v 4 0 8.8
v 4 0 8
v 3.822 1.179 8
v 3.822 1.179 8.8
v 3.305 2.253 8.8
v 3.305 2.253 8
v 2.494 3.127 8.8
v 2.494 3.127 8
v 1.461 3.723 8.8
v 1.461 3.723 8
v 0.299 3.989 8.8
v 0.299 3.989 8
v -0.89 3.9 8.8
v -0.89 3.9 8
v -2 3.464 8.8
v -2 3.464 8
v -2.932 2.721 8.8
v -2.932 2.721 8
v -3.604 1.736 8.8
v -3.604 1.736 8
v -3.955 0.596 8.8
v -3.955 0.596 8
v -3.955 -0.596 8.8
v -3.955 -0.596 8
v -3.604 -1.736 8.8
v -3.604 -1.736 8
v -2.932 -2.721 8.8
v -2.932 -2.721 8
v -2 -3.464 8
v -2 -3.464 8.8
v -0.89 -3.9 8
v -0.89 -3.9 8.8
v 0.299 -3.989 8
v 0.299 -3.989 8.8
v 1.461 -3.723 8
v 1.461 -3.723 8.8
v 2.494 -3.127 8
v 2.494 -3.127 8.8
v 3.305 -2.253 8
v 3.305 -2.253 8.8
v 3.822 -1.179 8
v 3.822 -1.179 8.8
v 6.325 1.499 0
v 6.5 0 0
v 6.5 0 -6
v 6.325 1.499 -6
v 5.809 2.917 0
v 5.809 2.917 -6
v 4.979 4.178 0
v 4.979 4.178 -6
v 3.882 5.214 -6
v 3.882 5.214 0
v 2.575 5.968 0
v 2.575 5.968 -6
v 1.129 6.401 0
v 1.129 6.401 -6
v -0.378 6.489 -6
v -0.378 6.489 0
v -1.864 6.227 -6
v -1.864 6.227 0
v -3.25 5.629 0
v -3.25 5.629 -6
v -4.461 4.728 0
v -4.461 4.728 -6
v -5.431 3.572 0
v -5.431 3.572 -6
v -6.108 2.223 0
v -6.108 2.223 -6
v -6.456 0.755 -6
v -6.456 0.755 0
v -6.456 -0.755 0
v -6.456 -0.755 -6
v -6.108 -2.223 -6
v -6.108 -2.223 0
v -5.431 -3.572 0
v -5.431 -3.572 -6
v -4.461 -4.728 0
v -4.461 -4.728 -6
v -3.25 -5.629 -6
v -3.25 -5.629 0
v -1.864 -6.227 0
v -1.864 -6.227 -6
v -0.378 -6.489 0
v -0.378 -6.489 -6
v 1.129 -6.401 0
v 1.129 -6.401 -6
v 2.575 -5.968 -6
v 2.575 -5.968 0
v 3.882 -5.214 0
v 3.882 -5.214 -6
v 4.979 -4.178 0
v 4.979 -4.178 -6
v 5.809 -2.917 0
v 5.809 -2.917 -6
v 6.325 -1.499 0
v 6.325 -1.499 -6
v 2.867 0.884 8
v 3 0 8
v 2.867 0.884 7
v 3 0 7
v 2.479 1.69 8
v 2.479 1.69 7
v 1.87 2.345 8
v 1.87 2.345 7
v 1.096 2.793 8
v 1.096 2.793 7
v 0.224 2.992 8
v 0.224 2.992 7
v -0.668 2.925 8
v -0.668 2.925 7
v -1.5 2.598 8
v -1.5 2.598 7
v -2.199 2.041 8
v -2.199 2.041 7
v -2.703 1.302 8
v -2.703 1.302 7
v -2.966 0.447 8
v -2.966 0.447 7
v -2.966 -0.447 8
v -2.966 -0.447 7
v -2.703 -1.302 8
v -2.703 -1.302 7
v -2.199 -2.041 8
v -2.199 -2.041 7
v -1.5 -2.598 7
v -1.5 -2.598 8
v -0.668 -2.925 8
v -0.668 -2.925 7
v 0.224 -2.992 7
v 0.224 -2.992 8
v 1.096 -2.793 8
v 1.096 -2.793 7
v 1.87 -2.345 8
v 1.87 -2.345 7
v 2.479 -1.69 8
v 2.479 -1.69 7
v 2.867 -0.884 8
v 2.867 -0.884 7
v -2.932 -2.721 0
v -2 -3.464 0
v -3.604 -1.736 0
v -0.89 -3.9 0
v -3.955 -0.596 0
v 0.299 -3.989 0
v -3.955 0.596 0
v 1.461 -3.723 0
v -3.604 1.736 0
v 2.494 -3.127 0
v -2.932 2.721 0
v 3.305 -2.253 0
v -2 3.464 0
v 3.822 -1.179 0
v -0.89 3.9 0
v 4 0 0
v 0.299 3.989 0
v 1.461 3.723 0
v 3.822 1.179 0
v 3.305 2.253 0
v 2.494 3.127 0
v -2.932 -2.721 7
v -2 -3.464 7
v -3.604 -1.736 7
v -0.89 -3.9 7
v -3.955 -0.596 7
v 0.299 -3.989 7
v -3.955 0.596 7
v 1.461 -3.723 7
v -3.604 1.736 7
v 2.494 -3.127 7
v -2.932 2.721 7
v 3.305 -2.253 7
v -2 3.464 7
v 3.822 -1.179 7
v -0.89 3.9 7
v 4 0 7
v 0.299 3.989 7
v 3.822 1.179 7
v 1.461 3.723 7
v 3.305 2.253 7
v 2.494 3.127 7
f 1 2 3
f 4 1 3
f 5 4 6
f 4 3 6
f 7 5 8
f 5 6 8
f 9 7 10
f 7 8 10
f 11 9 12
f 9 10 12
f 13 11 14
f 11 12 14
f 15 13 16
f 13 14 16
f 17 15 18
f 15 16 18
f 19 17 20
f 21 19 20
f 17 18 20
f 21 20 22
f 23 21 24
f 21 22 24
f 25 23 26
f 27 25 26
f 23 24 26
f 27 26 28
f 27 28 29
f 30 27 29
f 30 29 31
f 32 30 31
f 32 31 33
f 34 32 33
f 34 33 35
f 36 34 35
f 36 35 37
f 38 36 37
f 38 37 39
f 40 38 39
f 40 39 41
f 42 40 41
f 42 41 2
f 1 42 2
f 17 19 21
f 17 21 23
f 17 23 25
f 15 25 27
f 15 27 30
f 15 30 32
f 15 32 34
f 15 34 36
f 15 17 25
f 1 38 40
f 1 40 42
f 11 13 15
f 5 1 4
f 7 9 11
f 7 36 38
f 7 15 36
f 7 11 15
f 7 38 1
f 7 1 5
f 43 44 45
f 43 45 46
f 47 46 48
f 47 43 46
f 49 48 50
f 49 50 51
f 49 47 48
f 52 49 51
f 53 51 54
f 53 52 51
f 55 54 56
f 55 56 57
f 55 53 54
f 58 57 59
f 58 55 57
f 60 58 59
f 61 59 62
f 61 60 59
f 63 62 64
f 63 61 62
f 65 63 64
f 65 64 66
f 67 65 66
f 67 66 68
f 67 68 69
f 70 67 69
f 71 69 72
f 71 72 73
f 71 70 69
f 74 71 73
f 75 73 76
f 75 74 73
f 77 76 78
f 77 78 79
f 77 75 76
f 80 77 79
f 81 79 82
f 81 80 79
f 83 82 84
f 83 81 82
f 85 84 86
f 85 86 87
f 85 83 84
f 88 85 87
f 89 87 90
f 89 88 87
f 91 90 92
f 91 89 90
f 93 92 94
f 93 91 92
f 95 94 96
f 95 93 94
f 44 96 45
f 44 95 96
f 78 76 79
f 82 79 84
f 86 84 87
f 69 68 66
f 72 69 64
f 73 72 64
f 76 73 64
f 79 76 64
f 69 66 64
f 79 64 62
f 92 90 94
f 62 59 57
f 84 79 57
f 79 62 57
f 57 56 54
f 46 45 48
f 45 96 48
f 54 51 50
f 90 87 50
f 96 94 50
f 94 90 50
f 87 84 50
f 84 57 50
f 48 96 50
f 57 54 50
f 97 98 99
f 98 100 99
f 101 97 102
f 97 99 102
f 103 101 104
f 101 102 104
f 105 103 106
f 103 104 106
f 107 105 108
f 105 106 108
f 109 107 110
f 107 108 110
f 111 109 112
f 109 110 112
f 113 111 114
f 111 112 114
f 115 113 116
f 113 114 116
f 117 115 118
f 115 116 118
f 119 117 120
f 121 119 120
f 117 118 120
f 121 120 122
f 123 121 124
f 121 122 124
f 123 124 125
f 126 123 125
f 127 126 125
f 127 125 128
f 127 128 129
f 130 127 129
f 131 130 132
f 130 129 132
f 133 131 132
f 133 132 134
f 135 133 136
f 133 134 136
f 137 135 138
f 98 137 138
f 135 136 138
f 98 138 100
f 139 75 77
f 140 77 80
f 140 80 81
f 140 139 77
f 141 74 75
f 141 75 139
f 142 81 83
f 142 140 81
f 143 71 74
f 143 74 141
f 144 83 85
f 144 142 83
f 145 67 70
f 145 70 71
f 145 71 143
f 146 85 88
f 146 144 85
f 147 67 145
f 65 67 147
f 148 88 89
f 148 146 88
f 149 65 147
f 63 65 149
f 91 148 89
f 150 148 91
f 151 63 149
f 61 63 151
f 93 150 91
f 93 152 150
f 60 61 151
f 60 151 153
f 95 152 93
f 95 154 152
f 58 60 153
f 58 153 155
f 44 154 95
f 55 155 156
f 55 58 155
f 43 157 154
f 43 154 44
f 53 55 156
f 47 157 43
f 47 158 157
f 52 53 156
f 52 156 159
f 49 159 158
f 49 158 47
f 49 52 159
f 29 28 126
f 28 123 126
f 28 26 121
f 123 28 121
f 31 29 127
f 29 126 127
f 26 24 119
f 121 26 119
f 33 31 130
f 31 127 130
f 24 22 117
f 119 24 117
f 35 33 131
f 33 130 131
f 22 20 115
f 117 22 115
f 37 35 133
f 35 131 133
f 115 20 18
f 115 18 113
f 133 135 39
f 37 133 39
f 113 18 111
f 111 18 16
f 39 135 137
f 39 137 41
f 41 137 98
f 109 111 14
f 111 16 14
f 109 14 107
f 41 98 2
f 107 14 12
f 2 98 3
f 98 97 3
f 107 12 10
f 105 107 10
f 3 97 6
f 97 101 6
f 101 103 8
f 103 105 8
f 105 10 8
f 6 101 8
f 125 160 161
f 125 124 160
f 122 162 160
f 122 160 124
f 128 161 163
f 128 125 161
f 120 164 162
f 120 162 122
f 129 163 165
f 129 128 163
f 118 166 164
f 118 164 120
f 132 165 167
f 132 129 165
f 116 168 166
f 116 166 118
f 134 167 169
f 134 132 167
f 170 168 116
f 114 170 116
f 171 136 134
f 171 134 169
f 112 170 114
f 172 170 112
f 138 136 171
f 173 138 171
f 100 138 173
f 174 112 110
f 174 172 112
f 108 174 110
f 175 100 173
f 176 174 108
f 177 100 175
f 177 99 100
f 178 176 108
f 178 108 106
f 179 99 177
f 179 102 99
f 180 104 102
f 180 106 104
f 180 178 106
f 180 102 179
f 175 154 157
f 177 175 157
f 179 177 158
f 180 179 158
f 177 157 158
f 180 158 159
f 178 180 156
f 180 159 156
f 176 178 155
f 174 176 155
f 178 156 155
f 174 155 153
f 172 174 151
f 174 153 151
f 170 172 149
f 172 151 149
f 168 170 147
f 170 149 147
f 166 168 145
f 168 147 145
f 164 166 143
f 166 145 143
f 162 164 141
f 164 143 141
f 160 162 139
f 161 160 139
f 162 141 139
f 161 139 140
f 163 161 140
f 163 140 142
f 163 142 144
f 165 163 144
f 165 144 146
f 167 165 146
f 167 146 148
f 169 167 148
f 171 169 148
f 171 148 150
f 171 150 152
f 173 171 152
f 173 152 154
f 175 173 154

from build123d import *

# Parameters (mm, degrees)
SKETCH1_R           = 6.5
BOSS_EXTRUDE1_DEPTH = 6
SKETCH2_R           = 4
BOSS_EXTRUDE2_DEPTH = 8.8
SKETCH3_R           = 4
SKETCH3_R_2         = 3
CUT_EXTRUDE1_DEPTH  = 0.5


with BuildPart() as part:
    # Sketch1 → Boss-Extrude1 (new body)
    with BuildSketch(Plane.XY):
        Circle(SKETCH1_R)
    extrude(amount=-BOSS_EXTRUDE1_DEPTH)

    # Sketch2 → Boss-Extrude2 (add)
    with BuildSketch(Plane.XY):
        Circle(SKETCH2_R)
    extrude(amount=BOSS_EXTRUDE2_DEPTH)

    # Sketch3 → Cut-Extrude1 (cut, symmetric)
    with BuildSketch(Plane.XY.offset(7.5)):
        Circle(SKETCH3_R)
        Circle(SKETCH3_R_2, mode=Mode.SUBTRACT)
    extrude(amount=CUT_EXTRUDE1_DEPTH, both=True, mode=Mode.SUBTRACT)


solid = part.part
